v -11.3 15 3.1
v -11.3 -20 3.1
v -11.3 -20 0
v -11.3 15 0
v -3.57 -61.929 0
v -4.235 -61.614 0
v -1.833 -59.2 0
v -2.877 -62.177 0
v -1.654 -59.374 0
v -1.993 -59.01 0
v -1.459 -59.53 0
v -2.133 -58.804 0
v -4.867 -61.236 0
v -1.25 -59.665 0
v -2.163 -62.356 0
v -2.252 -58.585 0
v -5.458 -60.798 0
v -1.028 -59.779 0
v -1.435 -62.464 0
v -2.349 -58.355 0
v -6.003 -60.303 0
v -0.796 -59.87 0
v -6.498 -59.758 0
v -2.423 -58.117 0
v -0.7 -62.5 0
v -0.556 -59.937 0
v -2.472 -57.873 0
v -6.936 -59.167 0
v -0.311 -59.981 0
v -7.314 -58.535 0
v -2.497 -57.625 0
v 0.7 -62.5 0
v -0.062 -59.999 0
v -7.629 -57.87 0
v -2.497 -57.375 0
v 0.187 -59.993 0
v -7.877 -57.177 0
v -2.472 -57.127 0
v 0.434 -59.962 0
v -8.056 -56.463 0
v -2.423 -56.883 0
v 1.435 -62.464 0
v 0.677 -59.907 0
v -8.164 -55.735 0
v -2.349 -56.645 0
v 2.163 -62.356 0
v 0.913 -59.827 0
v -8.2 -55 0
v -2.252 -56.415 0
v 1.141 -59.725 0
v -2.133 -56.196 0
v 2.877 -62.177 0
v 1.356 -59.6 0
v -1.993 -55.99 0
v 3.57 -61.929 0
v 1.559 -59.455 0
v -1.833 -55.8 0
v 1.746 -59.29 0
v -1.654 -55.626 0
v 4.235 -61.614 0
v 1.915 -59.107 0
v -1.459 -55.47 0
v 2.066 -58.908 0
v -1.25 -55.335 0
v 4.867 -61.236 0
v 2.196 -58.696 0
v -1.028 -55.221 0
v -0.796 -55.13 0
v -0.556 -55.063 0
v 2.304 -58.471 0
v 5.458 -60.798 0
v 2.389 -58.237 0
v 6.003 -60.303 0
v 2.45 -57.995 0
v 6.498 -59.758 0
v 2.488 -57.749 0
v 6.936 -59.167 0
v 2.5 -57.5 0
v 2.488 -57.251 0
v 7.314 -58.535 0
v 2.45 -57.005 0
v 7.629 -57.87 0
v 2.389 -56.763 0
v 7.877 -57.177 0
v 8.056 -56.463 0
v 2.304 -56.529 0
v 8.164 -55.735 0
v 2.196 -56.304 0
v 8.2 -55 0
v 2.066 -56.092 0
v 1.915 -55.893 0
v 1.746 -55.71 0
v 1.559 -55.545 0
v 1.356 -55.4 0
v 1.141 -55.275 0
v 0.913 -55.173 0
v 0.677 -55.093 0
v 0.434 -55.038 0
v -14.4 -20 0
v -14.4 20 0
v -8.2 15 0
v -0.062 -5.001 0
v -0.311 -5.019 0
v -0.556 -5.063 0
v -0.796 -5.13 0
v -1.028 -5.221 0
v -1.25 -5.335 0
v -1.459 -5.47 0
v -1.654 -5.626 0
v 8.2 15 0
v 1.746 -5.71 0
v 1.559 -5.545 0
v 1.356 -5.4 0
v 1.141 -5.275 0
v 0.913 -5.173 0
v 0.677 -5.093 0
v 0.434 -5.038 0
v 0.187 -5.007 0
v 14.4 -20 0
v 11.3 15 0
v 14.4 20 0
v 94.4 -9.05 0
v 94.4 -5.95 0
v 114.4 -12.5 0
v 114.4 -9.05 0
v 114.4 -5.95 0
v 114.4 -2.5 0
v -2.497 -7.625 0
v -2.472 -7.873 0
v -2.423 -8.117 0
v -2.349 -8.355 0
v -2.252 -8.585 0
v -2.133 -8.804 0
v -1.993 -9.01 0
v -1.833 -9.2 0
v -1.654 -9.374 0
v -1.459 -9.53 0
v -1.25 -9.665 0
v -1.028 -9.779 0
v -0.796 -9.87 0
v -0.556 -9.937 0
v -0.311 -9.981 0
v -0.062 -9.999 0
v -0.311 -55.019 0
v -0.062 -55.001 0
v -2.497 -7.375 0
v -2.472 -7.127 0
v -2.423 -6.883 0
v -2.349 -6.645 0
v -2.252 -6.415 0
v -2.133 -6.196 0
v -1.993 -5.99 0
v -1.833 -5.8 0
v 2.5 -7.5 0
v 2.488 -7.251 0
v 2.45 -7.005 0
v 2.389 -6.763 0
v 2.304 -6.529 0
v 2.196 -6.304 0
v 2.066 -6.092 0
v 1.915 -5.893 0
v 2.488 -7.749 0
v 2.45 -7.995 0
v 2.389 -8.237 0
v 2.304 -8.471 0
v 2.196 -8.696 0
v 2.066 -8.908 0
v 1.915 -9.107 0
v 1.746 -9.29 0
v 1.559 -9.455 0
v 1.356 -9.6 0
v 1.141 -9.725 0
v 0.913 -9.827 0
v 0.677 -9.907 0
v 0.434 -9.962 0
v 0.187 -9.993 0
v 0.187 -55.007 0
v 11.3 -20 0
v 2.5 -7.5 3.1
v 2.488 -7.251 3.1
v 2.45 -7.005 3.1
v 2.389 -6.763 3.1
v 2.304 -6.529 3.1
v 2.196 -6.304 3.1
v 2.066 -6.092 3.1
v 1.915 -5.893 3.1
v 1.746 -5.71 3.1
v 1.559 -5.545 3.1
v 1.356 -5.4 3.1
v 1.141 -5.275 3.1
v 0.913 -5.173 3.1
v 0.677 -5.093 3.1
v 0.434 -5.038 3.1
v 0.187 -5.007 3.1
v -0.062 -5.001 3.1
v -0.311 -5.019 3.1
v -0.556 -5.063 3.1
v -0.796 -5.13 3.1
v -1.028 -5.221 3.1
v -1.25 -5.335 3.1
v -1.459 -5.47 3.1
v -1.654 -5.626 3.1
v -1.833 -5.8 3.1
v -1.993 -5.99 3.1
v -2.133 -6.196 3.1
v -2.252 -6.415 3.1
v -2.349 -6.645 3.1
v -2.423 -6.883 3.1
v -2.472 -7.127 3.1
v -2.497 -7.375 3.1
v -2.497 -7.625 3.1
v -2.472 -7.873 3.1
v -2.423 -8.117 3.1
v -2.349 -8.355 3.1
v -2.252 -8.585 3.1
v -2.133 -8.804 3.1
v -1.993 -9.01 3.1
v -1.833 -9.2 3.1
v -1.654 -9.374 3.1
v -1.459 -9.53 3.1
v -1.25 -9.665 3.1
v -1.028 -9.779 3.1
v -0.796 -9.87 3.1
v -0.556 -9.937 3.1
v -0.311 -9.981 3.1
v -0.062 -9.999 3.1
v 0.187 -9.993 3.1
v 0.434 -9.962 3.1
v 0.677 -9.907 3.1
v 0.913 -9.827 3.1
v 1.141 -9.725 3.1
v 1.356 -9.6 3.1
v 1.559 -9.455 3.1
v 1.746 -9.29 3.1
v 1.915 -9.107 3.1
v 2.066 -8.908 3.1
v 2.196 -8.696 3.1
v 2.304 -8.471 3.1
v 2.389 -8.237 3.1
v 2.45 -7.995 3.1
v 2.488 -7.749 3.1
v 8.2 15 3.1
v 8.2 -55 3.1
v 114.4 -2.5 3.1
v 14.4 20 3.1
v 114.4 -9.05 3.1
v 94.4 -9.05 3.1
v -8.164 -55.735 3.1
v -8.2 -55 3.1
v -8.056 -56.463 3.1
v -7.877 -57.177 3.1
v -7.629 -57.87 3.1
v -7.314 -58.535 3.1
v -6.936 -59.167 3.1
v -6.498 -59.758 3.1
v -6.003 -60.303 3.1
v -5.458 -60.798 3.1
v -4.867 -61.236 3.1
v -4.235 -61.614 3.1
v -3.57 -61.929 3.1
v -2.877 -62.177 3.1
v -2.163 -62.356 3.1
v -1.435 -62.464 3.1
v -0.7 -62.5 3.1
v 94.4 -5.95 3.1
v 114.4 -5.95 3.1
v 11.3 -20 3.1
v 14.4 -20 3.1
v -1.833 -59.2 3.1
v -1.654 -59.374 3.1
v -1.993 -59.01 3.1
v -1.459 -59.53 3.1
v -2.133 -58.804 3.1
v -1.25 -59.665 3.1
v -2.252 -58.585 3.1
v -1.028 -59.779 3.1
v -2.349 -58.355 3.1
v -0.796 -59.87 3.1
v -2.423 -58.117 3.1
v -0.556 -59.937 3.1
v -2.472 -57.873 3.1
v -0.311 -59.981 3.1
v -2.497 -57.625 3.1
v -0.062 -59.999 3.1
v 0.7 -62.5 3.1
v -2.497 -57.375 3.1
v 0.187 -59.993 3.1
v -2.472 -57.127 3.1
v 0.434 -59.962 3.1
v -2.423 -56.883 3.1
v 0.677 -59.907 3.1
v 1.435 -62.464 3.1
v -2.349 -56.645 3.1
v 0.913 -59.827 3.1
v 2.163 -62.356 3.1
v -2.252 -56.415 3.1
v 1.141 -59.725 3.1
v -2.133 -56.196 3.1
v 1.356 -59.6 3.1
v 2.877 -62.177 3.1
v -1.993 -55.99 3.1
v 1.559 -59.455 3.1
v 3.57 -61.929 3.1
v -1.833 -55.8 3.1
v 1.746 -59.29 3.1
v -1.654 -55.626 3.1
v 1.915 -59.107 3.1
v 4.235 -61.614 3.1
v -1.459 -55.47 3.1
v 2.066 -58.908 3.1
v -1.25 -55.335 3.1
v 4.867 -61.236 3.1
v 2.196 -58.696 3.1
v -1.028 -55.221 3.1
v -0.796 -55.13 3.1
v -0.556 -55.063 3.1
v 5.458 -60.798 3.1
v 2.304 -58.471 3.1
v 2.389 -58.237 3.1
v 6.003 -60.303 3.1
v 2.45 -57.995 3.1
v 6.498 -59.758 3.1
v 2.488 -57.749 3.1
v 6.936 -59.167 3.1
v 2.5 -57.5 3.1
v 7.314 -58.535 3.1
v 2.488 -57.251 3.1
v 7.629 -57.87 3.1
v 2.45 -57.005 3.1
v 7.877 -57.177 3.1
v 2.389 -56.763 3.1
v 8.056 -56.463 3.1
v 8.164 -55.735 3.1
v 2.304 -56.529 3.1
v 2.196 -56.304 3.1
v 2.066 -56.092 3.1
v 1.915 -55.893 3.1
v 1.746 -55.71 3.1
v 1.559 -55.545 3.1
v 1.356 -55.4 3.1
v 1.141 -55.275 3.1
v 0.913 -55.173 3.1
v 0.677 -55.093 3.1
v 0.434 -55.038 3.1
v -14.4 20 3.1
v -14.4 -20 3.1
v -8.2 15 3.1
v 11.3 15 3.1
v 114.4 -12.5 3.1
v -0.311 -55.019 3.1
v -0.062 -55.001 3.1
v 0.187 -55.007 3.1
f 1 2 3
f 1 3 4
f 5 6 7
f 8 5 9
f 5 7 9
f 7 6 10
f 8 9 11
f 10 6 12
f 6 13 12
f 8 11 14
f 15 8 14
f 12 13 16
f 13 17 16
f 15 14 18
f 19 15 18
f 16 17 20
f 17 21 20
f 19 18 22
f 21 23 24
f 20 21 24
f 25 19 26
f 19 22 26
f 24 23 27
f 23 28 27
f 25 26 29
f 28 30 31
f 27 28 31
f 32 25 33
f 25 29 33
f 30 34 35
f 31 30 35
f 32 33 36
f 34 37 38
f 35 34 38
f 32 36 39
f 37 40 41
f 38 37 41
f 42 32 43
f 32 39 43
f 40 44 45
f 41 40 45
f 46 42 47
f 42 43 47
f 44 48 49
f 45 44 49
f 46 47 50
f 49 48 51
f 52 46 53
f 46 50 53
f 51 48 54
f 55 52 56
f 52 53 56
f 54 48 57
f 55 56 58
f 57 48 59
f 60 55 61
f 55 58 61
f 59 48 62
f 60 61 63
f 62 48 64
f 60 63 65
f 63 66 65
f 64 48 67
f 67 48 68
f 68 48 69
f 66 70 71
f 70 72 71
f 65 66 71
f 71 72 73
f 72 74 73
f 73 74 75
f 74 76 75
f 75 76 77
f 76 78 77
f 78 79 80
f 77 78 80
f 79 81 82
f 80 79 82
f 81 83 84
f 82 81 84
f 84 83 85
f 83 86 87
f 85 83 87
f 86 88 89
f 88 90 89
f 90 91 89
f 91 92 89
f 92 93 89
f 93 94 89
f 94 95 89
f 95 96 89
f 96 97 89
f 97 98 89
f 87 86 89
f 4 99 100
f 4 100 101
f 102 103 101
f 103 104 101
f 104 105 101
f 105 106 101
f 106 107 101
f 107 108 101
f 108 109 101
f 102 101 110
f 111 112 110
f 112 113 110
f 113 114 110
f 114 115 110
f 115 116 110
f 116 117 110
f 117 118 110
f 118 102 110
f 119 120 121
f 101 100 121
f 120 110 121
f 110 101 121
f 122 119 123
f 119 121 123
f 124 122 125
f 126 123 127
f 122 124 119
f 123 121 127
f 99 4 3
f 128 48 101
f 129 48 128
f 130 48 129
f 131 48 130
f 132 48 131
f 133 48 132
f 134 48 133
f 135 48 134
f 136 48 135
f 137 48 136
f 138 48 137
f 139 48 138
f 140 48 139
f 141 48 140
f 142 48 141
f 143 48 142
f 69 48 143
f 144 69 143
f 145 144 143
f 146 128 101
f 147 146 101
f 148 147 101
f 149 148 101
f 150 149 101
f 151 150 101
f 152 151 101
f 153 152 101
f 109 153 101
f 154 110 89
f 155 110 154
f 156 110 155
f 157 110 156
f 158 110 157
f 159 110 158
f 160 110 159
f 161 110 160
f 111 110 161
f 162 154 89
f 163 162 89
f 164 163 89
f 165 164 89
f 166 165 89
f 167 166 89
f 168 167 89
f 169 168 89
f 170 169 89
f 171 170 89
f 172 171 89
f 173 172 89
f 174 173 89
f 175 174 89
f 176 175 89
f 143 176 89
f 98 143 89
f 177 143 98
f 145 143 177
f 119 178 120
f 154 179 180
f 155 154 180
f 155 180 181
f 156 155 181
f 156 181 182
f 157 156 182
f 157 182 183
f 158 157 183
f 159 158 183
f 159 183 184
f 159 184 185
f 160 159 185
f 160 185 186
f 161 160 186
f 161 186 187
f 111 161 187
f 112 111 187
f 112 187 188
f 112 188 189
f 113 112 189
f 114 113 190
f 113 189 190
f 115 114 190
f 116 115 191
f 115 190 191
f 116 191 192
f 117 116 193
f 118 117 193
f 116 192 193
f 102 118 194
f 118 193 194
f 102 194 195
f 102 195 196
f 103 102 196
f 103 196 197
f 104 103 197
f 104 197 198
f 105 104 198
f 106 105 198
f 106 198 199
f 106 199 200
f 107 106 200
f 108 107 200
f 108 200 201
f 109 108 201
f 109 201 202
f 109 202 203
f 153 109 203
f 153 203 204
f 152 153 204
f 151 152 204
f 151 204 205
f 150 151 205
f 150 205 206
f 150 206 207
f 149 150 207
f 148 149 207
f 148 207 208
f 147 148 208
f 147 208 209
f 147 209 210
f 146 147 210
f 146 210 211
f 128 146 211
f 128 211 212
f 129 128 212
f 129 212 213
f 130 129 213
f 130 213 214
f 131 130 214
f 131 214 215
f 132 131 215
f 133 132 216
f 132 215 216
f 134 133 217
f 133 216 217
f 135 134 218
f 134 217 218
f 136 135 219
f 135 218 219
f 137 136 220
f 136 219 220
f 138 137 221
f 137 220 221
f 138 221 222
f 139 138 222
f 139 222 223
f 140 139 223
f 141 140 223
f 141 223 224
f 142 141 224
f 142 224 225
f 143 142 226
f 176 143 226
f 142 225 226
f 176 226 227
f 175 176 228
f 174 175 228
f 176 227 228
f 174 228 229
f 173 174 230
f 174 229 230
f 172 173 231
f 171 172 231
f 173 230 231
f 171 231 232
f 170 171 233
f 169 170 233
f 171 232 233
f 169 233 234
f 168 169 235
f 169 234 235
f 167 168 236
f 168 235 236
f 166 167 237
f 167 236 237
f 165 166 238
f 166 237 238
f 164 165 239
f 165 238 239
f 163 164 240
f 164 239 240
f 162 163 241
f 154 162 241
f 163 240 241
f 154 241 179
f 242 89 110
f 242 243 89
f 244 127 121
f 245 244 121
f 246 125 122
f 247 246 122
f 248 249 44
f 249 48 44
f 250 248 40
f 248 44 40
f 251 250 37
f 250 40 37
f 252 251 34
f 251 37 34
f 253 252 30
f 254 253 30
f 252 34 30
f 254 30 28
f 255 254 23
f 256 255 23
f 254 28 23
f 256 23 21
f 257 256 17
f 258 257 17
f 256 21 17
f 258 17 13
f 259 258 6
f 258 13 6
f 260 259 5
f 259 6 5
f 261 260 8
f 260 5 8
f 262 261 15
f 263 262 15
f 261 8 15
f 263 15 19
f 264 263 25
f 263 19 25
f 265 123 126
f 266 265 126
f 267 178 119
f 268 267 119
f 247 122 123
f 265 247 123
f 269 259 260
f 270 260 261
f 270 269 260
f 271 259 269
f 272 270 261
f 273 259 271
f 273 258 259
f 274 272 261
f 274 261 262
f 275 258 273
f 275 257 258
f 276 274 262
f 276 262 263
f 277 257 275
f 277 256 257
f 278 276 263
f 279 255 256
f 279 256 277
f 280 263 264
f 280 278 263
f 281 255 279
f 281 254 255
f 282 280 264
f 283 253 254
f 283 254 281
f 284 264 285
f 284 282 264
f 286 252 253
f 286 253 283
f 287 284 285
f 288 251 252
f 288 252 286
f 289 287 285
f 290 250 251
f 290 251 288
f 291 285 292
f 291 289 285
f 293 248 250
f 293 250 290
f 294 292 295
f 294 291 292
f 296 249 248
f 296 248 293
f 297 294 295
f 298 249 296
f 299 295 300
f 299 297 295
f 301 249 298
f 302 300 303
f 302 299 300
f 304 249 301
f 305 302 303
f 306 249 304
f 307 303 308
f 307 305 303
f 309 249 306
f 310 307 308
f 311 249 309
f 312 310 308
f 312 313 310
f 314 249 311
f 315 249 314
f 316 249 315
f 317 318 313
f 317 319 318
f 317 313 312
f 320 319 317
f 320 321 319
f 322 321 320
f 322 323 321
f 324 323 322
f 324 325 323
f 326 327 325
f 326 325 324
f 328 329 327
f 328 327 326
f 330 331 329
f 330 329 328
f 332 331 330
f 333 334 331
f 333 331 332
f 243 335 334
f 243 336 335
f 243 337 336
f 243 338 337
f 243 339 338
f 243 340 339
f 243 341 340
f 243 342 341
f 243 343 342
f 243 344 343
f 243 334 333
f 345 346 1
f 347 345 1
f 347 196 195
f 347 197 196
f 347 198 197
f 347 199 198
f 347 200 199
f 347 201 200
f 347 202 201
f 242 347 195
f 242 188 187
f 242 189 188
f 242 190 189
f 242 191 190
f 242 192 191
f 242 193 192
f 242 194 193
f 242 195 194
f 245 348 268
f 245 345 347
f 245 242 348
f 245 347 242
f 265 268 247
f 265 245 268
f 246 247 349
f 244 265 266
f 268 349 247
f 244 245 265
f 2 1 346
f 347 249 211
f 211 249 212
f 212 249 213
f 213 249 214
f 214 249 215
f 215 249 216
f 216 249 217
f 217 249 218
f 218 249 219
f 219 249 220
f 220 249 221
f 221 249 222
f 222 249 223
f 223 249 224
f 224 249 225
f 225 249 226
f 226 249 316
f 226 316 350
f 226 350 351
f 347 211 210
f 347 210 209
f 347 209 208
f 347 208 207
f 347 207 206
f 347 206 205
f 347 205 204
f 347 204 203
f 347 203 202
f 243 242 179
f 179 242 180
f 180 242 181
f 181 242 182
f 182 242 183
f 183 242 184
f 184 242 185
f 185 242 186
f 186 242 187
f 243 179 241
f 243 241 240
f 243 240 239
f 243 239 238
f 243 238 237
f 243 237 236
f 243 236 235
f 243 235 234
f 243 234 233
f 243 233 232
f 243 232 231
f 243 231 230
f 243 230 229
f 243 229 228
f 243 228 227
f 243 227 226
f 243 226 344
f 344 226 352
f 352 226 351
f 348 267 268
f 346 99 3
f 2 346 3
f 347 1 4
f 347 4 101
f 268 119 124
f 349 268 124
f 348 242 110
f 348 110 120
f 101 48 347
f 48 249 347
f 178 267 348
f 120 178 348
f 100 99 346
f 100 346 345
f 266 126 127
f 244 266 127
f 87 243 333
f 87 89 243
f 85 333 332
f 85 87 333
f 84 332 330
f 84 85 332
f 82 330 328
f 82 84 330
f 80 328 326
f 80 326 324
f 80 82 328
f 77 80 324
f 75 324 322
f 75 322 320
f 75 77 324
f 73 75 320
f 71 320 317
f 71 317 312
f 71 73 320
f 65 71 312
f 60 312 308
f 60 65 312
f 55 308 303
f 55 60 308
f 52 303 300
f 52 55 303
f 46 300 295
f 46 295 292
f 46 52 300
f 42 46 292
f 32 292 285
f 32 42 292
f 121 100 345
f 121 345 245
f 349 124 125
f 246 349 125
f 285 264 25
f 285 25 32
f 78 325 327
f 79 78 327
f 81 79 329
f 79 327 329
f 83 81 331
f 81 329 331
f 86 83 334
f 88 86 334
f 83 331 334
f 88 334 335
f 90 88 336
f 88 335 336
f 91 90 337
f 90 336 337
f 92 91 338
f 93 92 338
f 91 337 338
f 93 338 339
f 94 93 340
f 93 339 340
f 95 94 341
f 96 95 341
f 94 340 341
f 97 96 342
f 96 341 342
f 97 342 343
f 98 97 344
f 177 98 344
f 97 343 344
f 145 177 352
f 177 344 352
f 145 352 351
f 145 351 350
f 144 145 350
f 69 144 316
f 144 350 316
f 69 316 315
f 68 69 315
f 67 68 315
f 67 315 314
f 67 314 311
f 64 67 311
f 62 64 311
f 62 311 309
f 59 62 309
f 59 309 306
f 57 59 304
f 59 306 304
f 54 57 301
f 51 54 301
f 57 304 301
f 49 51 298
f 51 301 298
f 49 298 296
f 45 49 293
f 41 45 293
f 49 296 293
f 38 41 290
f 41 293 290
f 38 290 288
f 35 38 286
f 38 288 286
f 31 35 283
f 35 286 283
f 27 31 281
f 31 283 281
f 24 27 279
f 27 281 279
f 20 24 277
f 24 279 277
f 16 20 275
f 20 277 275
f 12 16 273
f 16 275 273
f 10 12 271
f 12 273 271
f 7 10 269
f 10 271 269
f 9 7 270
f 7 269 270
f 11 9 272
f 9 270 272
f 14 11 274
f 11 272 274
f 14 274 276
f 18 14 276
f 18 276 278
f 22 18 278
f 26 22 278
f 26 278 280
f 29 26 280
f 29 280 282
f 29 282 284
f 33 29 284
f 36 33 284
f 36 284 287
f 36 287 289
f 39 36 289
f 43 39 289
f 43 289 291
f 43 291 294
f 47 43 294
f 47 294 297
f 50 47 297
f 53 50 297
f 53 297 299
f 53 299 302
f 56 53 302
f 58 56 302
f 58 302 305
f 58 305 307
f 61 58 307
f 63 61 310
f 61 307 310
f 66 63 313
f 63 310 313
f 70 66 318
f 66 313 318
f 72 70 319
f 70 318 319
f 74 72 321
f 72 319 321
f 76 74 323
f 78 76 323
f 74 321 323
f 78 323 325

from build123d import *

# Parameters (mm, degrees)
SKETCH1_W           = 28.8
SKETCH1_H           = 40
BOSS_EXTRUDE1_DEPTH = 3.1
SKETCH2_R           = 2.5
SKETCH2_W           = 3.1
SKETCH2_H           = 35
CUT_EXTRUDE1_DEPTH  = 4.1
SKETCH3_W           = 16.4
SKETCH3_H           = 42.5
SKETCH3_R           = 2.5
BOSS_EXTRUDE2_DEPTH = 3.1
FILLET1_R           = 7.5
BOSS_EXTRUDE3_DEPTH = 3.1


with BuildPart() as part:
    # Sketch1 → Boss-Extrude1 (new body)
    with BuildSketch(Plane.XY):
        Rectangle(SKETCH1_W, SKETCH1_H)
    extrude(amount=BOSS_EXTRUDE1_DEPTH)

    # Sketch2 → Cut-Extrude1 (cut, through all)
    with BuildSketch(Plane.XY.offset(3.1)):
        with Locations((0, -7.5)):
            Circle(SKETCH2_R)
        with Locations((-9.75, -2.5)):
            Rectangle(SKETCH2_W, SKETCH2_H)
        with Locations((9.75, -2.5)):
            Rectangle(SKETCH2_W, SKETCH2_H)
    extrude(amount=-CUT_EXTRUDE1_DEPTH, mode=Mode.SUBTRACT)

    # Sketch3 → Boss-Extrude2 (add, through all)
    with BuildSketch(Plane.XY.offset(3.1)):
        with Locations((0, -41.25)):
            Rectangle(SKETCH3_W, SKETCH3_H)
        with Locations((0, -57.5)):
            Circle(SKETCH3_R, mode=Mode.SUBTRACT)
    extrude(amount=-BOSS_EXTRUDE2_DEPTH)

    # Fillet1
    fillet1_edges = [part.edges().sort_by_distance(p)[0] for p in [
        (-8.2, -62.5, 1.55),
        (8.2, -62.5, 1.55),
    ]]
    fillet(fillet1_edges, radius=FILLET1_R)

    # Sketch4 → Boss-Extrude3 (add, through all)
    with BuildSketch(Plane(origin=(0, 0, 0), x_dir=(-1, 0, 0), z_dir=(0, 0, -1))):
        Polygon((-14.4, 20), (-14.4, -20), (-114.4, -12.5), (-114.4, -9.05), (-94.4, -9.05), (-94.4, -5.95), (-114.4, -5.95), (-114.4, -2.5), align=None)
    extrude(amount=-BOSS_EXTRUDE3_DEPTH)


solid = part.part
